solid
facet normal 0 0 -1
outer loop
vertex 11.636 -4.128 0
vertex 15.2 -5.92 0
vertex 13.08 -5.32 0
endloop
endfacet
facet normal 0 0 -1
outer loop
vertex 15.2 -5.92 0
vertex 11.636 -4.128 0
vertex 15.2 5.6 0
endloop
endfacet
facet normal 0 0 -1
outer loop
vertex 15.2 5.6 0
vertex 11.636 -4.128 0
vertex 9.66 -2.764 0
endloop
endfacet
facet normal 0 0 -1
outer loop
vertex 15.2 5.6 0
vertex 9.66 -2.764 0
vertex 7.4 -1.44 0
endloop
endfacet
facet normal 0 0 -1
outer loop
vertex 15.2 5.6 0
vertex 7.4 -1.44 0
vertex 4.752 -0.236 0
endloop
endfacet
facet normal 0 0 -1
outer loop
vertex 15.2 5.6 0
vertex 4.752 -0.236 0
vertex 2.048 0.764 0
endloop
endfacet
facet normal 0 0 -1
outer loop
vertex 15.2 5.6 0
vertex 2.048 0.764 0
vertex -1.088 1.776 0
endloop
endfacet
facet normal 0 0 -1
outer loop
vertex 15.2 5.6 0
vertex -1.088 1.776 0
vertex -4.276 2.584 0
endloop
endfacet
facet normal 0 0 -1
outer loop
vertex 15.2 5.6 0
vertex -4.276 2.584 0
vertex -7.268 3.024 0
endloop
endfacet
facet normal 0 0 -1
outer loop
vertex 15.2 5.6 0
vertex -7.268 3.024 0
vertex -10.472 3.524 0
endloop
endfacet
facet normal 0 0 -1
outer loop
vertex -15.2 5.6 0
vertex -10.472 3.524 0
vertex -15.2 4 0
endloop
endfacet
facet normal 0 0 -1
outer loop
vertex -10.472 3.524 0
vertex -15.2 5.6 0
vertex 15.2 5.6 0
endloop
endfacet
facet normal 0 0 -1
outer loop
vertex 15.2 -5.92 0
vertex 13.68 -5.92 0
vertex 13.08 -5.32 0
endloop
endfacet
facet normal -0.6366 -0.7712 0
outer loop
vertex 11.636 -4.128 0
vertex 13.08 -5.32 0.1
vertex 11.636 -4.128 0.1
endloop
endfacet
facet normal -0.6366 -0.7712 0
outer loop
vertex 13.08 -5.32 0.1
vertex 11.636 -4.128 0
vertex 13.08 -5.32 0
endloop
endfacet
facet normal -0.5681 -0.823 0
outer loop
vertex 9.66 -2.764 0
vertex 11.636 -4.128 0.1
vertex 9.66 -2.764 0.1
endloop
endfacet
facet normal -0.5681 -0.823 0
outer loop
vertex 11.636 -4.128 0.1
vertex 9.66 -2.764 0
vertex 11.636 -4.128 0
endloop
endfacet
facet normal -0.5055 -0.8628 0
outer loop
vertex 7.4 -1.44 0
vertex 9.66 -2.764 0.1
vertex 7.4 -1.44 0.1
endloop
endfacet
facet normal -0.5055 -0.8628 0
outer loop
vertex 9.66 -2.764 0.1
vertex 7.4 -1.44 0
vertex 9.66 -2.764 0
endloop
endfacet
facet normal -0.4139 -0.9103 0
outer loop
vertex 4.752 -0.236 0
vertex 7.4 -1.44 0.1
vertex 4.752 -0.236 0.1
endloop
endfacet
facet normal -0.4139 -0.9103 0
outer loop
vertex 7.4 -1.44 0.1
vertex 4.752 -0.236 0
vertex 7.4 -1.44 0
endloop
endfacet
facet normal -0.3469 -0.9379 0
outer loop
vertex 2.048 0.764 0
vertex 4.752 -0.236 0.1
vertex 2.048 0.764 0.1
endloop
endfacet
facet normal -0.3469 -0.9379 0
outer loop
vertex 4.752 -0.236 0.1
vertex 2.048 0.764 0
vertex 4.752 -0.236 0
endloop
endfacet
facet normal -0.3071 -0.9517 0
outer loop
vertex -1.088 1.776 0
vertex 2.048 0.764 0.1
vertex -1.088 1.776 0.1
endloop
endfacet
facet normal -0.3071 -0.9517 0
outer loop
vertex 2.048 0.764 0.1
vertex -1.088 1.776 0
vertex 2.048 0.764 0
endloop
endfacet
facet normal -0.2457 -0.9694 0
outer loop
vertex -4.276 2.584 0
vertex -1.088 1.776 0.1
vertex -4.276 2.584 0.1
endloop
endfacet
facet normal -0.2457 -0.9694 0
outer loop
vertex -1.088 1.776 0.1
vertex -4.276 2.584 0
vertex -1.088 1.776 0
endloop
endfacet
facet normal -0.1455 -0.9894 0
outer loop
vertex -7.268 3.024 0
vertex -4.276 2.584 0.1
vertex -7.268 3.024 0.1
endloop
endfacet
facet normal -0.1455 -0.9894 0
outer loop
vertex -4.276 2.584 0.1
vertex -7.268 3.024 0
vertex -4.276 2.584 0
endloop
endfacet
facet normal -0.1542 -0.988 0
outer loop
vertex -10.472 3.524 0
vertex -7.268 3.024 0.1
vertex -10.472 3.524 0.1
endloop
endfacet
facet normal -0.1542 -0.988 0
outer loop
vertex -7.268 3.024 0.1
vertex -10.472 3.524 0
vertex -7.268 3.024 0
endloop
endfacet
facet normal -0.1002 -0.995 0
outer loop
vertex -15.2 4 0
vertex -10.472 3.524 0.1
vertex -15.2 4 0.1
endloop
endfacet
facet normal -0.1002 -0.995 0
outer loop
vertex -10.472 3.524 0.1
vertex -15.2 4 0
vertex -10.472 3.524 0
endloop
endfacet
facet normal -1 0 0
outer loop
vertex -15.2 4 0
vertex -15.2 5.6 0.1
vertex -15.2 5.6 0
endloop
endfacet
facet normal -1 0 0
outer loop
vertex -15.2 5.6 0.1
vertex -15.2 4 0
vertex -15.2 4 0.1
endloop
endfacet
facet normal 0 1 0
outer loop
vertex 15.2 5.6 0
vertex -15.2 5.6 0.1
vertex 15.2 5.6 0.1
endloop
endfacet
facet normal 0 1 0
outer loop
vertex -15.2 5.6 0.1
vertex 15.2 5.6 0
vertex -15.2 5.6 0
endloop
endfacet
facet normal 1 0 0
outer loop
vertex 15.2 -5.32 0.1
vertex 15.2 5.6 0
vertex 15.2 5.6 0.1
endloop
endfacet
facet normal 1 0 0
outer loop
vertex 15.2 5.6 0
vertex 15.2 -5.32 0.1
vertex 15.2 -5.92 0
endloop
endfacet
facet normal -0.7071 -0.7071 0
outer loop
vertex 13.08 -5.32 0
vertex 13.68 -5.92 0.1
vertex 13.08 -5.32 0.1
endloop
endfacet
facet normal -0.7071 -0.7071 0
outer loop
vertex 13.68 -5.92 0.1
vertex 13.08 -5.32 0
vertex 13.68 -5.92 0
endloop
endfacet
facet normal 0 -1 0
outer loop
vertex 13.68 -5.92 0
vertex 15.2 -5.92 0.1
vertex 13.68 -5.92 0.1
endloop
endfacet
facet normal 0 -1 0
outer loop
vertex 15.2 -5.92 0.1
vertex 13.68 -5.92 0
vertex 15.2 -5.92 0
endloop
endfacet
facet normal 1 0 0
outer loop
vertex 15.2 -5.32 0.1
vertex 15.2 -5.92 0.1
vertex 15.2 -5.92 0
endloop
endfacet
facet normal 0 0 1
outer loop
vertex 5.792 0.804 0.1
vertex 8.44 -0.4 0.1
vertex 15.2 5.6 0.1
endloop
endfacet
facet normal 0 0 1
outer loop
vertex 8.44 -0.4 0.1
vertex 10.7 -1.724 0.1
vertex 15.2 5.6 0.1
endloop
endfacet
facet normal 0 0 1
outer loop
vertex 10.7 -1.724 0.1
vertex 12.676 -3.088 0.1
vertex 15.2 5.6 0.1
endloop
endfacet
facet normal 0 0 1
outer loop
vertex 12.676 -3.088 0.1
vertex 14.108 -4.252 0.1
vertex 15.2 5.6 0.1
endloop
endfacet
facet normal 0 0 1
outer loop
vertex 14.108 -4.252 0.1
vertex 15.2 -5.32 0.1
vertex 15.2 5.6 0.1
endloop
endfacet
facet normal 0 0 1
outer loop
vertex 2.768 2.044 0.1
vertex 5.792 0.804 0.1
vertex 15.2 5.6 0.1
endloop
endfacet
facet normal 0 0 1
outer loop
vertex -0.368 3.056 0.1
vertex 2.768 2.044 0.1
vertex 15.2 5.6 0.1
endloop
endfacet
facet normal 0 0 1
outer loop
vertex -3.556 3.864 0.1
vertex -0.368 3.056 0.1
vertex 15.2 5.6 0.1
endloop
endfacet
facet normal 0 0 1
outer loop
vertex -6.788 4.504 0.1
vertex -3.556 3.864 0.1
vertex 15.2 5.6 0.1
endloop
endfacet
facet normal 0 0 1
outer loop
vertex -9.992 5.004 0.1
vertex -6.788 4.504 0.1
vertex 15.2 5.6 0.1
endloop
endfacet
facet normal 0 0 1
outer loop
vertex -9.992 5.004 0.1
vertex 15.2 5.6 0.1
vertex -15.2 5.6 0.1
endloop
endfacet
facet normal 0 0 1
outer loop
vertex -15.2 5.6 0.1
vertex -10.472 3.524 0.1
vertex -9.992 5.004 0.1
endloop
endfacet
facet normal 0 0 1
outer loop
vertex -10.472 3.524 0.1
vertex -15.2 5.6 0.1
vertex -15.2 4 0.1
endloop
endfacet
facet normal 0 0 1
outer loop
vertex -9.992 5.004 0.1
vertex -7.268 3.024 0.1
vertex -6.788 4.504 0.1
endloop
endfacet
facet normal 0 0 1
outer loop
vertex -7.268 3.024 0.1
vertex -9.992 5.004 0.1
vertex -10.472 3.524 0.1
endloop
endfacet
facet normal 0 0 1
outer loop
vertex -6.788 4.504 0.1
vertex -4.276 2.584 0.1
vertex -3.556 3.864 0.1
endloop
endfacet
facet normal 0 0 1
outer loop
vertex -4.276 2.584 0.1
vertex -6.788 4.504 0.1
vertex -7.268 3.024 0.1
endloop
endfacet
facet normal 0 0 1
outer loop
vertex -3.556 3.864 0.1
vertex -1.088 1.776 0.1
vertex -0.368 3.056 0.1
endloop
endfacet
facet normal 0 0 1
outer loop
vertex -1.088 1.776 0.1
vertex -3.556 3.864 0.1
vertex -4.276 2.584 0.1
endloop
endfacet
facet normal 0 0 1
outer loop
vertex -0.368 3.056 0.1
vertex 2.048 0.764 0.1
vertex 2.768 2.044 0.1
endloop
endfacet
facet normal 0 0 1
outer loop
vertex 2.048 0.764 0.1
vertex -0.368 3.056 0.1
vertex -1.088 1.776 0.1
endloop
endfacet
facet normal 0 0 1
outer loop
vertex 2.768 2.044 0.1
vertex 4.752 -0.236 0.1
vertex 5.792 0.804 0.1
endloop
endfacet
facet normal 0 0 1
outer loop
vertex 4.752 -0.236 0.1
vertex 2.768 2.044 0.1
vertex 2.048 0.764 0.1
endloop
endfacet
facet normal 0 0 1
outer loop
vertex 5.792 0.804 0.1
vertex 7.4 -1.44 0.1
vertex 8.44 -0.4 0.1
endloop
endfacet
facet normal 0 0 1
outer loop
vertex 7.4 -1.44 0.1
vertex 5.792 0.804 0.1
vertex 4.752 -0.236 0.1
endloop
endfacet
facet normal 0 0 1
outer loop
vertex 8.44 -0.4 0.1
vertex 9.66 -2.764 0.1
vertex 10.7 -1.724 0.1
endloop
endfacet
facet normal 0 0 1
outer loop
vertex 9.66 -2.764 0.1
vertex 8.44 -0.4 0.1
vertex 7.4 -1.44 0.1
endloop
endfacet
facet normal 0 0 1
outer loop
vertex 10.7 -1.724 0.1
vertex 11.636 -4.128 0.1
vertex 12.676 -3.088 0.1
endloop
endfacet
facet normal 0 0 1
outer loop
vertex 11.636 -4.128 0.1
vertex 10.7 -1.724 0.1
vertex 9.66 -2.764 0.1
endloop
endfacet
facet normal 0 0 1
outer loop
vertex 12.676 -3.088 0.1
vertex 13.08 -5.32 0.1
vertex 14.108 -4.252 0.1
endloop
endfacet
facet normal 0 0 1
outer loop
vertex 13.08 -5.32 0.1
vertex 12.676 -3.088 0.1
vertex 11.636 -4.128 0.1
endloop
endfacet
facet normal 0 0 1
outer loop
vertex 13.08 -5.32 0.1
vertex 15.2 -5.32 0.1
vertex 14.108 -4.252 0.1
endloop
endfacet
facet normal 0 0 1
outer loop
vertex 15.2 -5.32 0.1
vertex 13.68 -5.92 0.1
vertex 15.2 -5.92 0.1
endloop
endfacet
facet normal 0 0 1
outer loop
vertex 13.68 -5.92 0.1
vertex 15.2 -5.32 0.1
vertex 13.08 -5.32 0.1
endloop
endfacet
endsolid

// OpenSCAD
use <../lib.scad>
function ldraw_lib__6153754c() = [
// 0 Sticker  1.5 x  3.8 with Dark Azure Volkswagen Left Side Window Shape
// 0 Name: 6153754c.dat
// 0 Author: Magnus Forsberg [MagFors]
// 0 !LDRAW_ORG Part UPDATE 2016-01
// 0 !LICENSE Licensed under CC BY 2.0 and CC BY 4.0 : see CAreadme.txt
// 
// 0 BFC CERTIFY CCW
  [0,"BFC","CERTIFY"],
  [0,"BFC","CCW"],
// 
// 0 !KEYWORDS Beetle, set 10252, VW
// 
// 0 !HISTORY 2016-12-31 [PTadmin] Official Update 2016-01
// 
// 
// 4 16 38 0 14 38 0 -14.8 32.7 0 -13.3 29.09 0 -10.32
  [4,16,38,0,14,38,0,-14.8,32.7,0,-13.3,29.09,0,-10.32],
// 3 16 38 0 14 29.09 0 -10.32 24.15 0 -6.91
  [3,16,38,0,14,29.09,0,-10.32,24.15,0,-6.91],
// 3 16 38 0 14 24.15 0 -6.91 18.5 0 -3.6
  [3,16,38,0,14,24.15,0,-6.91,18.5,0,-3.6],
// 3 16 38 0 14 18.5 0 -3.6 11.88 0 -0.59
  [3,16,38,0,14,18.5,0,-3.6,11.88,0,-0.59],
// 3 16 38 0 14 11.88 0 -0.59 5.12 0 1.91
  [3,16,38,0,14,11.88,0,-0.59,5.12,0,1.91],
// 3 16 38 0 14 5.12 0 1.91 -2.72 0 4.44
  [3,16,38,0,14,5.12,0,1.91,-2.72,0,4.44],
// 3 16 38 0 14 -2.72 0 4.44 -10.69 0 6.46
  [3,16,38,0,14,-2.72,0,4.44,-10.69,0,6.46],
// 3 16 38 0 14 -10.69 0 6.46 -18.17 0 7.56
  [3,16,38,0,14,-10.69,0,6.46,-18.17,0,7.56],
// 3 16 38 0 14 -18.17 0 7.56 -26.18 0 8.81
  [3,16,38,0,14,-18.17,0,7.56,-26.18,0,8.81],
// 4 16 38 0 14 -26.18 0 8.81 -38 0 10 -38 0 14
  [4,16,38,0,14,-26.18,0,8.81,-38,0,10,-38,0,14],
// 3 16 38 0 -14.8 34.2 0 -14.8 32.7 0 -13.3
  [3,16,38,0,-14.8,34.2,0,-14.8,32.7,0,-13.3],
// 0 // sides
// 4 16 32.7 -0.25 -13.3 29.09 -0.25 -10.32 29.09 0 -10.32 32.7 0 -13.3
  [4,16,32.7,-0.25,-13.3,29.09,-0.25,-10.32,29.09,0,-10.32,32.7,0,-13.3],
// 4 16 29.09 -0.25 -10.32 24.15 -0.25 -6.91 24.15 0 -6.91 29.09 0 -10.32
  [4,16,29.09,-0.25,-10.32,24.15,-0.25,-6.91,24.15,0,-6.91,29.09,0,-10.32],
// 4 16 24.15 -0.25 -6.91 18.5 -0.25 -3.6 18.5 0 -3.6 24.15 0 -6.91
  [4,16,24.15,-0.25,-6.91,18.5,-0.25,-3.6,18.5,0,-3.6,24.15,0,-6.91],
// 4 16 18.5 -0.25 -3.6 11.88 -0.25 -0.59 11.88 0 -0.59 18.5 0 -3.6
  [4,16,18.5,-0.25,-3.6,11.88,-0.25,-0.59,11.88,0,-0.59,18.5,0,-3.6],
// 4 16 11.88 -0.25 -0.59 5.12 -0.25 1.91 5.12 0 1.91 11.88 0 -0.59
  [4,16,11.88,-0.25,-0.59,5.12,-0.25,1.91,5.12,0,1.91,11.88,0,-0.59],
// 4 16 5.12 -0.25 1.91 -2.72 -0.25 4.44 -2.72 0 4.44 5.12 0 1.91
  [4,16,5.12,-0.25,1.91,-2.72,-0.25,4.44,-2.72,0,4.44,5.12,0,1.91],
// 4 16 -2.72 -0.25 4.44 -10.69 -0.25 6.46 -10.69 0 6.46 -2.72 0 4.44
  [4,16,-2.72,-0.25,4.44,-10.69,-0.25,6.46,-10.69,0,6.46,-2.72,0,4.44],
// 4 16 -10.69 -0.25 6.46 -18.17 -0.25 7.56 -18.17 0 7.56 -10.69 0 6.46
  [4,16,-10.69,-0.25,6.46,-18.17,-0.25,7.56,-18.17,0,7.56,-10.69,0,6.46],
// 4 16 -18.17 -0.25 7.56 -26.18 -0.25 8.81 -26.18 0 8.81 -18.17 0 7.56
  [4,16,-18.17,-0.25,7.56,-26.18,-0.25,8.81,-26.18,0,8.81,-18.17,0,7.56],
// 4 16 -26.18 -0.25 8.81 -38 -0.25 10 -38 0 10 -26.18 0 8.81
  [4,16,-26.18,-0.25,8.81,-38,-0.25,10,-38,0,10,-26.18,0,8.81],
// 4 16 -38 -0.25 10 -38 -0.25 14 -38 0 14 -38 0 10
  [4,16,-38,-0.25,10,-38,-0.25,14,-38,0,14,-38,0,10],
// 4 16 -38 -0.25 14 38 -0.25 14 38 0 14 -38 0 14
  [4,16,-38,-0.25,14,38,-0.25,14,38,0,14,-38,0,14],
// 4 16 38 -0.25 14 38 -0.25 -13.3 38 0 -14.8 38 0 14
  [4,16,38,-0.25,14,38,-0.25,-13.3,38,0,-14.8,38,0,14],
// 4 16 34.2 -0.25 -14.8 32.7 -0.25 -13.3 32.7 0 -13.3 34.2 0 -14.8
  [4,16,34.2,-0.25,-14.8,32.7,-0.25,-13.3,32.7,0,-13.3,34.2,0,-14.8],
// 4 16 38 -0.25 -14.8 34.2 -0.25 -14.8 34.2 0 -14.8 38 0 -14.8
  [4,16,38,-0.25,-14.8,34.2,-0.25,-14.8,34.2,0,-14.8,38,0,-14.8],
// 3 16 38 -0.25 -13.3 38 -0.25 -14.8 38 0 -14.8
  [3,16,38,-0.25,-13.3,38,-0.25,-14.8,38,0,-14.8],
// 5 24 29.09 0 -10.32 29.09 -0.25 -10.32 24.15 0 -6.91 32.7 0 -13.3
  [5,24,29.09,0,-10.32,29.09,-0.25,-10.32,24.15,0,-6.91,32.7,0,-13.3],
// 5 24 24.15 0 -6.91 24.15 -0.25 -6.91 18.5 0 -3.6 29.09 0 -10.32
  [5,24,24.15,0,-6.91,24.15,-0.25,-6.91,18.5,0,-3.6,29.09,0,-10.32],
// 5 24 18.5 0 -3.6 18.5 -0.25 -3.6 11.88 0 -0.59 24.15 0 -6.91
  [5,24,18.5,0,-3.6,18.5,-0.25,-3.6,11.88,0,-0.59,24.15,0,-6.91],
// 5 24 11.88 0 -0.59 11.88 -0.25 -0.59 5.12 0 1.91 18.5 0 -3.6
  [5,24,11.88,0,-0.59,11.88,-0.25,-0.59,5.12,0,1.91,18.5,0,-3.6],
// 5 24 5.12 0 1.91 5.12 -0.25 1.91 -2.72 0 4.44 11.88 0 -0.59
  [5,24,5.12,0,1.91,5.12,-0.25,1.91,-2.72,0,4.44,11.88,0,-0.59],
// 5 24 -2.72 0 4.44 -2.72 -0.25 4.44 -10.69 0 6.46 5.12 0 1.91
  [5,24,-2.72,0,4.44,-2.72,-0.25,4.44,-10.69,0,6.46,5.12,0,1.91],
// 5 24 -10.69 0 6.46 -10.69 -0.25 6.46 -18.17 0 7.56 -2.72 0 4.44
  [5,24,-10.69,0,6.46,-10.69,-0.25,6.46,-18.17,0,7.56,-2.72,0,4.44],
// 5 24 -18.17 0 7.56 -18.17 -0.25 7.56 -26.18 0 8.81 -10.69 0 6.46
  [5,24,-18.17,0,7.56,-18.17,-0.25,7.56,-26.18,0,8.81,-10.69,0,6.46],
// 5 24 -26.18 0 8.81 -26.18 -0.25 8.81 -38 0 10 -18.17 0 7.56
  [5,24,-26.18,0,8.81,-26.18,-0.25,8.81,-38,0,10,-18.17,0,7.56],
// 5 24 32.7 0 -13.3 32.7 -0.25 -13.3 34.2 0 -14.8 29.09 0 -10.32
  [5,24,32.7,0,-13.3,32.7,-0.25,-13.3,34.2,0,-14.8,29.09,0,-10.32],
// 0 BFC NOCLIP
  [0,"BFC","NOCLIP"],
// 3 321 14.48 -0.25 2.01 21.1 -0.25 -1 38 -0.25 14
  [3,321,14.48,-0.25,2.01,21.1,-0.25,-1,38,-0.25,14],
// 3 321 21.1 -0.25 -1 26.75 -0.25 -4.31 38 -0.25 14
  [3,321,21.1,-0.25,-1,26.75,-0.25,-4.31,38,-0.25,14],
// 3 321 26.75 -0.25 -4.31 31.69 -0.25 -7.72 38 -0.25 14
  [3,321,26.75,-0.25,-4.31,31.69,-0.25,-7.72,38,-0.25,14],
// 3 321 31.69 -0.25 -7.72 35.27 -0.25 -10.63 38 -0.25 14
  [3,321,31.69,-0.25,-7.72,35.27,-0.25,-10.63,38,-0.25,14],
// 3 321 35.27 -0.25 -10.63 38 -0.25 -13.3 38 -0.25 14
  [3,321,35.27,-0.25,-10.63,38,-0.25,-13.3,38,-0.25,14],
// 3 321 6.92 -0.25 5.11 14.48 -0.25 2.01 38 -0.25 14
  [3,321,6.92,-0.25,5.11,14.48,-0.25,2.01,38,-0.25,14],
// 3 321 -0.92 -0.25 7.64 6.92 -0.25 5.11 38 -0.25 14
  [3,321,-0.92,-0.25,7.64,6.92,-0.25,5.11,38,-0.25,14],
// 3 321 -8.89 -0.25 9.66 -0.92 -0.25 7.64 38 -0.25 14
  [3,321,-8.89,-0.25,9.66,-0.92,-0.25,7.64,38,-0.25,14],
// 3 321 -16.97 -0.25 11.26 -8.89 -0.25 9.66 38 -0.25 14
  [3,321,-16.97,-0.25,11.26,-8.89,-0.25,9.66,38,-0.25,14],
// 3 321 -24.98 -0.25 12.51 -16.97 -0.25 11.26 38 -0.25 14
  [3,321,-24.98,-0.25,12.51,-16.97,-0.25,11.26,38,-0.25,14],
// 3 321 -24.98 -0.25 12.51 38 -0.25 14 -38 -0.25 14
  [3,321,-24.98,-0.25,12.51,38,-0.25,14,-38,-0.25,14],
// 0 BFC CLIP
  [0,"BFC","CLIP"],
// 4 16 -38 -0.25 14 -38 -0.25 10 -26.18 -0.25 8.81 -24.98 -0.25 12.51
  [4,16,-38,-0.25,14,-38,-0.25,10,-26.18,-0.25,8.81,-24.98,-0.25,12.51],
// 4 16 -26.18 -0.25 8.81 -18.17 -0.25 7.56 -16.97 -0.25 11.26 -24.98 -0.25 12.51
  [4,16,-26.18,-0.25,8.81,-18.17,-0.25,7.56,-16.97,-0.25,11.26,-24.98,-0.25,12.51],
// 4 16 -18.17 -0.25 7.56 -10.69 -0.25 6.46 -8.89 -0.25 9.66 -16.97 -0.25 11.26
  [4,16,-18.17,-0.25,7.56,-10.69,-0.25,6.46,-8.89,-0.25,9.66,-16.97,-0.25,11.26],
// 4 16 -10.69 -0.25 6.46 -2.72 -0.25 4.44 -0.92 -0.25 7.64 -8.89 -0.25 9.66
  [4,16,-10.69,-0.25,6.46,-2.72,-0.25,4.44,-0.92,-0.25,7.64,-8.89,-0.25,9.66],
// 4 16 -2.72 -0.25 4.44 5.12 -0.25 1.91 6.92 -0.25 5.11 -0.92 -0.25 7.64
  [4,16,-2.72,-0.25,4.44,5.12,-0.25,1.91,6.92,-0.25,5.11,-0.92,-0.25,7.64],
// 4 16 5.12 -0.25 1.91 11.88 -0.25 -0.59 14.48 -0.25 2.01 6.92 -0.25 5.11
  [4,16,5.12,-0.25,1.91,11.88,-0.25,-0.59,14.48,-0.25,2.01,6.92,-0.25,5.11],
// 4 16 11.88 -0.25 -0.59 18.5 -0.25 -3.6 21.1 -0.25 -1 14.48 -0.25 2.01
  [4,16,11.88,-0.25,-0.59,18.5,-0.25,-3.6,21.1,-0.25,-1,14.48,-0.25,2.01],
// 4 16 18.5 -0.25 -3.6 24.15 -0.25 -6.91 26.75 -0.25 -4.31 21.1 -0.25 -1
  [4,16,18.5,-0.25,-3.6,24.15,-0.25,-6.91,26.75,-0.25,-4.31,21.1,-0.25,-1],
// 4 16 24.15 -0.25 -6.91 29.09 -0.25 -10.32 31.69 -0.25 -7.72 26.75 -0.25 -4.31
  [4,16,24.15,-0.25,-6.91,29.09,-0.25,-10.32,31.69,-0.25,-7.72,26.75,-0.25,-4.31],
// 4 16 29.09 -0.25 -10.32 32.7 -0.25 -13.3 35.27 -0.25 -10.63 31.69 -0.25 -7.72
  [4,16,29.09,-0.25,-10.32,32.7,-0.25,-13.3,35.27,-0.25,-10.63,31.69,-0.25,-7.72],
// 3 16 32.7 -0.25 -13.3 38 -0.25 -13.3 35.27 -0.25 -10.63
  [3,16,32.7,-0.25,-13.3,38,-0.25,-13.3,35.27,-0.25,-10.63],
// 4 16 32.7 -0.25 -13.3 34.2 -0.25 -14.8 38 -0.25 -14.8 38 -0.25 -13.3
  [4,16,32.7,-0.25,-13.3,34.2,-0.25,-14.8,38,-0.25,-14.8,38,-0.25,-13.3],
];
makepoly(ldraw_lib__6153754c(), line=0.2);
